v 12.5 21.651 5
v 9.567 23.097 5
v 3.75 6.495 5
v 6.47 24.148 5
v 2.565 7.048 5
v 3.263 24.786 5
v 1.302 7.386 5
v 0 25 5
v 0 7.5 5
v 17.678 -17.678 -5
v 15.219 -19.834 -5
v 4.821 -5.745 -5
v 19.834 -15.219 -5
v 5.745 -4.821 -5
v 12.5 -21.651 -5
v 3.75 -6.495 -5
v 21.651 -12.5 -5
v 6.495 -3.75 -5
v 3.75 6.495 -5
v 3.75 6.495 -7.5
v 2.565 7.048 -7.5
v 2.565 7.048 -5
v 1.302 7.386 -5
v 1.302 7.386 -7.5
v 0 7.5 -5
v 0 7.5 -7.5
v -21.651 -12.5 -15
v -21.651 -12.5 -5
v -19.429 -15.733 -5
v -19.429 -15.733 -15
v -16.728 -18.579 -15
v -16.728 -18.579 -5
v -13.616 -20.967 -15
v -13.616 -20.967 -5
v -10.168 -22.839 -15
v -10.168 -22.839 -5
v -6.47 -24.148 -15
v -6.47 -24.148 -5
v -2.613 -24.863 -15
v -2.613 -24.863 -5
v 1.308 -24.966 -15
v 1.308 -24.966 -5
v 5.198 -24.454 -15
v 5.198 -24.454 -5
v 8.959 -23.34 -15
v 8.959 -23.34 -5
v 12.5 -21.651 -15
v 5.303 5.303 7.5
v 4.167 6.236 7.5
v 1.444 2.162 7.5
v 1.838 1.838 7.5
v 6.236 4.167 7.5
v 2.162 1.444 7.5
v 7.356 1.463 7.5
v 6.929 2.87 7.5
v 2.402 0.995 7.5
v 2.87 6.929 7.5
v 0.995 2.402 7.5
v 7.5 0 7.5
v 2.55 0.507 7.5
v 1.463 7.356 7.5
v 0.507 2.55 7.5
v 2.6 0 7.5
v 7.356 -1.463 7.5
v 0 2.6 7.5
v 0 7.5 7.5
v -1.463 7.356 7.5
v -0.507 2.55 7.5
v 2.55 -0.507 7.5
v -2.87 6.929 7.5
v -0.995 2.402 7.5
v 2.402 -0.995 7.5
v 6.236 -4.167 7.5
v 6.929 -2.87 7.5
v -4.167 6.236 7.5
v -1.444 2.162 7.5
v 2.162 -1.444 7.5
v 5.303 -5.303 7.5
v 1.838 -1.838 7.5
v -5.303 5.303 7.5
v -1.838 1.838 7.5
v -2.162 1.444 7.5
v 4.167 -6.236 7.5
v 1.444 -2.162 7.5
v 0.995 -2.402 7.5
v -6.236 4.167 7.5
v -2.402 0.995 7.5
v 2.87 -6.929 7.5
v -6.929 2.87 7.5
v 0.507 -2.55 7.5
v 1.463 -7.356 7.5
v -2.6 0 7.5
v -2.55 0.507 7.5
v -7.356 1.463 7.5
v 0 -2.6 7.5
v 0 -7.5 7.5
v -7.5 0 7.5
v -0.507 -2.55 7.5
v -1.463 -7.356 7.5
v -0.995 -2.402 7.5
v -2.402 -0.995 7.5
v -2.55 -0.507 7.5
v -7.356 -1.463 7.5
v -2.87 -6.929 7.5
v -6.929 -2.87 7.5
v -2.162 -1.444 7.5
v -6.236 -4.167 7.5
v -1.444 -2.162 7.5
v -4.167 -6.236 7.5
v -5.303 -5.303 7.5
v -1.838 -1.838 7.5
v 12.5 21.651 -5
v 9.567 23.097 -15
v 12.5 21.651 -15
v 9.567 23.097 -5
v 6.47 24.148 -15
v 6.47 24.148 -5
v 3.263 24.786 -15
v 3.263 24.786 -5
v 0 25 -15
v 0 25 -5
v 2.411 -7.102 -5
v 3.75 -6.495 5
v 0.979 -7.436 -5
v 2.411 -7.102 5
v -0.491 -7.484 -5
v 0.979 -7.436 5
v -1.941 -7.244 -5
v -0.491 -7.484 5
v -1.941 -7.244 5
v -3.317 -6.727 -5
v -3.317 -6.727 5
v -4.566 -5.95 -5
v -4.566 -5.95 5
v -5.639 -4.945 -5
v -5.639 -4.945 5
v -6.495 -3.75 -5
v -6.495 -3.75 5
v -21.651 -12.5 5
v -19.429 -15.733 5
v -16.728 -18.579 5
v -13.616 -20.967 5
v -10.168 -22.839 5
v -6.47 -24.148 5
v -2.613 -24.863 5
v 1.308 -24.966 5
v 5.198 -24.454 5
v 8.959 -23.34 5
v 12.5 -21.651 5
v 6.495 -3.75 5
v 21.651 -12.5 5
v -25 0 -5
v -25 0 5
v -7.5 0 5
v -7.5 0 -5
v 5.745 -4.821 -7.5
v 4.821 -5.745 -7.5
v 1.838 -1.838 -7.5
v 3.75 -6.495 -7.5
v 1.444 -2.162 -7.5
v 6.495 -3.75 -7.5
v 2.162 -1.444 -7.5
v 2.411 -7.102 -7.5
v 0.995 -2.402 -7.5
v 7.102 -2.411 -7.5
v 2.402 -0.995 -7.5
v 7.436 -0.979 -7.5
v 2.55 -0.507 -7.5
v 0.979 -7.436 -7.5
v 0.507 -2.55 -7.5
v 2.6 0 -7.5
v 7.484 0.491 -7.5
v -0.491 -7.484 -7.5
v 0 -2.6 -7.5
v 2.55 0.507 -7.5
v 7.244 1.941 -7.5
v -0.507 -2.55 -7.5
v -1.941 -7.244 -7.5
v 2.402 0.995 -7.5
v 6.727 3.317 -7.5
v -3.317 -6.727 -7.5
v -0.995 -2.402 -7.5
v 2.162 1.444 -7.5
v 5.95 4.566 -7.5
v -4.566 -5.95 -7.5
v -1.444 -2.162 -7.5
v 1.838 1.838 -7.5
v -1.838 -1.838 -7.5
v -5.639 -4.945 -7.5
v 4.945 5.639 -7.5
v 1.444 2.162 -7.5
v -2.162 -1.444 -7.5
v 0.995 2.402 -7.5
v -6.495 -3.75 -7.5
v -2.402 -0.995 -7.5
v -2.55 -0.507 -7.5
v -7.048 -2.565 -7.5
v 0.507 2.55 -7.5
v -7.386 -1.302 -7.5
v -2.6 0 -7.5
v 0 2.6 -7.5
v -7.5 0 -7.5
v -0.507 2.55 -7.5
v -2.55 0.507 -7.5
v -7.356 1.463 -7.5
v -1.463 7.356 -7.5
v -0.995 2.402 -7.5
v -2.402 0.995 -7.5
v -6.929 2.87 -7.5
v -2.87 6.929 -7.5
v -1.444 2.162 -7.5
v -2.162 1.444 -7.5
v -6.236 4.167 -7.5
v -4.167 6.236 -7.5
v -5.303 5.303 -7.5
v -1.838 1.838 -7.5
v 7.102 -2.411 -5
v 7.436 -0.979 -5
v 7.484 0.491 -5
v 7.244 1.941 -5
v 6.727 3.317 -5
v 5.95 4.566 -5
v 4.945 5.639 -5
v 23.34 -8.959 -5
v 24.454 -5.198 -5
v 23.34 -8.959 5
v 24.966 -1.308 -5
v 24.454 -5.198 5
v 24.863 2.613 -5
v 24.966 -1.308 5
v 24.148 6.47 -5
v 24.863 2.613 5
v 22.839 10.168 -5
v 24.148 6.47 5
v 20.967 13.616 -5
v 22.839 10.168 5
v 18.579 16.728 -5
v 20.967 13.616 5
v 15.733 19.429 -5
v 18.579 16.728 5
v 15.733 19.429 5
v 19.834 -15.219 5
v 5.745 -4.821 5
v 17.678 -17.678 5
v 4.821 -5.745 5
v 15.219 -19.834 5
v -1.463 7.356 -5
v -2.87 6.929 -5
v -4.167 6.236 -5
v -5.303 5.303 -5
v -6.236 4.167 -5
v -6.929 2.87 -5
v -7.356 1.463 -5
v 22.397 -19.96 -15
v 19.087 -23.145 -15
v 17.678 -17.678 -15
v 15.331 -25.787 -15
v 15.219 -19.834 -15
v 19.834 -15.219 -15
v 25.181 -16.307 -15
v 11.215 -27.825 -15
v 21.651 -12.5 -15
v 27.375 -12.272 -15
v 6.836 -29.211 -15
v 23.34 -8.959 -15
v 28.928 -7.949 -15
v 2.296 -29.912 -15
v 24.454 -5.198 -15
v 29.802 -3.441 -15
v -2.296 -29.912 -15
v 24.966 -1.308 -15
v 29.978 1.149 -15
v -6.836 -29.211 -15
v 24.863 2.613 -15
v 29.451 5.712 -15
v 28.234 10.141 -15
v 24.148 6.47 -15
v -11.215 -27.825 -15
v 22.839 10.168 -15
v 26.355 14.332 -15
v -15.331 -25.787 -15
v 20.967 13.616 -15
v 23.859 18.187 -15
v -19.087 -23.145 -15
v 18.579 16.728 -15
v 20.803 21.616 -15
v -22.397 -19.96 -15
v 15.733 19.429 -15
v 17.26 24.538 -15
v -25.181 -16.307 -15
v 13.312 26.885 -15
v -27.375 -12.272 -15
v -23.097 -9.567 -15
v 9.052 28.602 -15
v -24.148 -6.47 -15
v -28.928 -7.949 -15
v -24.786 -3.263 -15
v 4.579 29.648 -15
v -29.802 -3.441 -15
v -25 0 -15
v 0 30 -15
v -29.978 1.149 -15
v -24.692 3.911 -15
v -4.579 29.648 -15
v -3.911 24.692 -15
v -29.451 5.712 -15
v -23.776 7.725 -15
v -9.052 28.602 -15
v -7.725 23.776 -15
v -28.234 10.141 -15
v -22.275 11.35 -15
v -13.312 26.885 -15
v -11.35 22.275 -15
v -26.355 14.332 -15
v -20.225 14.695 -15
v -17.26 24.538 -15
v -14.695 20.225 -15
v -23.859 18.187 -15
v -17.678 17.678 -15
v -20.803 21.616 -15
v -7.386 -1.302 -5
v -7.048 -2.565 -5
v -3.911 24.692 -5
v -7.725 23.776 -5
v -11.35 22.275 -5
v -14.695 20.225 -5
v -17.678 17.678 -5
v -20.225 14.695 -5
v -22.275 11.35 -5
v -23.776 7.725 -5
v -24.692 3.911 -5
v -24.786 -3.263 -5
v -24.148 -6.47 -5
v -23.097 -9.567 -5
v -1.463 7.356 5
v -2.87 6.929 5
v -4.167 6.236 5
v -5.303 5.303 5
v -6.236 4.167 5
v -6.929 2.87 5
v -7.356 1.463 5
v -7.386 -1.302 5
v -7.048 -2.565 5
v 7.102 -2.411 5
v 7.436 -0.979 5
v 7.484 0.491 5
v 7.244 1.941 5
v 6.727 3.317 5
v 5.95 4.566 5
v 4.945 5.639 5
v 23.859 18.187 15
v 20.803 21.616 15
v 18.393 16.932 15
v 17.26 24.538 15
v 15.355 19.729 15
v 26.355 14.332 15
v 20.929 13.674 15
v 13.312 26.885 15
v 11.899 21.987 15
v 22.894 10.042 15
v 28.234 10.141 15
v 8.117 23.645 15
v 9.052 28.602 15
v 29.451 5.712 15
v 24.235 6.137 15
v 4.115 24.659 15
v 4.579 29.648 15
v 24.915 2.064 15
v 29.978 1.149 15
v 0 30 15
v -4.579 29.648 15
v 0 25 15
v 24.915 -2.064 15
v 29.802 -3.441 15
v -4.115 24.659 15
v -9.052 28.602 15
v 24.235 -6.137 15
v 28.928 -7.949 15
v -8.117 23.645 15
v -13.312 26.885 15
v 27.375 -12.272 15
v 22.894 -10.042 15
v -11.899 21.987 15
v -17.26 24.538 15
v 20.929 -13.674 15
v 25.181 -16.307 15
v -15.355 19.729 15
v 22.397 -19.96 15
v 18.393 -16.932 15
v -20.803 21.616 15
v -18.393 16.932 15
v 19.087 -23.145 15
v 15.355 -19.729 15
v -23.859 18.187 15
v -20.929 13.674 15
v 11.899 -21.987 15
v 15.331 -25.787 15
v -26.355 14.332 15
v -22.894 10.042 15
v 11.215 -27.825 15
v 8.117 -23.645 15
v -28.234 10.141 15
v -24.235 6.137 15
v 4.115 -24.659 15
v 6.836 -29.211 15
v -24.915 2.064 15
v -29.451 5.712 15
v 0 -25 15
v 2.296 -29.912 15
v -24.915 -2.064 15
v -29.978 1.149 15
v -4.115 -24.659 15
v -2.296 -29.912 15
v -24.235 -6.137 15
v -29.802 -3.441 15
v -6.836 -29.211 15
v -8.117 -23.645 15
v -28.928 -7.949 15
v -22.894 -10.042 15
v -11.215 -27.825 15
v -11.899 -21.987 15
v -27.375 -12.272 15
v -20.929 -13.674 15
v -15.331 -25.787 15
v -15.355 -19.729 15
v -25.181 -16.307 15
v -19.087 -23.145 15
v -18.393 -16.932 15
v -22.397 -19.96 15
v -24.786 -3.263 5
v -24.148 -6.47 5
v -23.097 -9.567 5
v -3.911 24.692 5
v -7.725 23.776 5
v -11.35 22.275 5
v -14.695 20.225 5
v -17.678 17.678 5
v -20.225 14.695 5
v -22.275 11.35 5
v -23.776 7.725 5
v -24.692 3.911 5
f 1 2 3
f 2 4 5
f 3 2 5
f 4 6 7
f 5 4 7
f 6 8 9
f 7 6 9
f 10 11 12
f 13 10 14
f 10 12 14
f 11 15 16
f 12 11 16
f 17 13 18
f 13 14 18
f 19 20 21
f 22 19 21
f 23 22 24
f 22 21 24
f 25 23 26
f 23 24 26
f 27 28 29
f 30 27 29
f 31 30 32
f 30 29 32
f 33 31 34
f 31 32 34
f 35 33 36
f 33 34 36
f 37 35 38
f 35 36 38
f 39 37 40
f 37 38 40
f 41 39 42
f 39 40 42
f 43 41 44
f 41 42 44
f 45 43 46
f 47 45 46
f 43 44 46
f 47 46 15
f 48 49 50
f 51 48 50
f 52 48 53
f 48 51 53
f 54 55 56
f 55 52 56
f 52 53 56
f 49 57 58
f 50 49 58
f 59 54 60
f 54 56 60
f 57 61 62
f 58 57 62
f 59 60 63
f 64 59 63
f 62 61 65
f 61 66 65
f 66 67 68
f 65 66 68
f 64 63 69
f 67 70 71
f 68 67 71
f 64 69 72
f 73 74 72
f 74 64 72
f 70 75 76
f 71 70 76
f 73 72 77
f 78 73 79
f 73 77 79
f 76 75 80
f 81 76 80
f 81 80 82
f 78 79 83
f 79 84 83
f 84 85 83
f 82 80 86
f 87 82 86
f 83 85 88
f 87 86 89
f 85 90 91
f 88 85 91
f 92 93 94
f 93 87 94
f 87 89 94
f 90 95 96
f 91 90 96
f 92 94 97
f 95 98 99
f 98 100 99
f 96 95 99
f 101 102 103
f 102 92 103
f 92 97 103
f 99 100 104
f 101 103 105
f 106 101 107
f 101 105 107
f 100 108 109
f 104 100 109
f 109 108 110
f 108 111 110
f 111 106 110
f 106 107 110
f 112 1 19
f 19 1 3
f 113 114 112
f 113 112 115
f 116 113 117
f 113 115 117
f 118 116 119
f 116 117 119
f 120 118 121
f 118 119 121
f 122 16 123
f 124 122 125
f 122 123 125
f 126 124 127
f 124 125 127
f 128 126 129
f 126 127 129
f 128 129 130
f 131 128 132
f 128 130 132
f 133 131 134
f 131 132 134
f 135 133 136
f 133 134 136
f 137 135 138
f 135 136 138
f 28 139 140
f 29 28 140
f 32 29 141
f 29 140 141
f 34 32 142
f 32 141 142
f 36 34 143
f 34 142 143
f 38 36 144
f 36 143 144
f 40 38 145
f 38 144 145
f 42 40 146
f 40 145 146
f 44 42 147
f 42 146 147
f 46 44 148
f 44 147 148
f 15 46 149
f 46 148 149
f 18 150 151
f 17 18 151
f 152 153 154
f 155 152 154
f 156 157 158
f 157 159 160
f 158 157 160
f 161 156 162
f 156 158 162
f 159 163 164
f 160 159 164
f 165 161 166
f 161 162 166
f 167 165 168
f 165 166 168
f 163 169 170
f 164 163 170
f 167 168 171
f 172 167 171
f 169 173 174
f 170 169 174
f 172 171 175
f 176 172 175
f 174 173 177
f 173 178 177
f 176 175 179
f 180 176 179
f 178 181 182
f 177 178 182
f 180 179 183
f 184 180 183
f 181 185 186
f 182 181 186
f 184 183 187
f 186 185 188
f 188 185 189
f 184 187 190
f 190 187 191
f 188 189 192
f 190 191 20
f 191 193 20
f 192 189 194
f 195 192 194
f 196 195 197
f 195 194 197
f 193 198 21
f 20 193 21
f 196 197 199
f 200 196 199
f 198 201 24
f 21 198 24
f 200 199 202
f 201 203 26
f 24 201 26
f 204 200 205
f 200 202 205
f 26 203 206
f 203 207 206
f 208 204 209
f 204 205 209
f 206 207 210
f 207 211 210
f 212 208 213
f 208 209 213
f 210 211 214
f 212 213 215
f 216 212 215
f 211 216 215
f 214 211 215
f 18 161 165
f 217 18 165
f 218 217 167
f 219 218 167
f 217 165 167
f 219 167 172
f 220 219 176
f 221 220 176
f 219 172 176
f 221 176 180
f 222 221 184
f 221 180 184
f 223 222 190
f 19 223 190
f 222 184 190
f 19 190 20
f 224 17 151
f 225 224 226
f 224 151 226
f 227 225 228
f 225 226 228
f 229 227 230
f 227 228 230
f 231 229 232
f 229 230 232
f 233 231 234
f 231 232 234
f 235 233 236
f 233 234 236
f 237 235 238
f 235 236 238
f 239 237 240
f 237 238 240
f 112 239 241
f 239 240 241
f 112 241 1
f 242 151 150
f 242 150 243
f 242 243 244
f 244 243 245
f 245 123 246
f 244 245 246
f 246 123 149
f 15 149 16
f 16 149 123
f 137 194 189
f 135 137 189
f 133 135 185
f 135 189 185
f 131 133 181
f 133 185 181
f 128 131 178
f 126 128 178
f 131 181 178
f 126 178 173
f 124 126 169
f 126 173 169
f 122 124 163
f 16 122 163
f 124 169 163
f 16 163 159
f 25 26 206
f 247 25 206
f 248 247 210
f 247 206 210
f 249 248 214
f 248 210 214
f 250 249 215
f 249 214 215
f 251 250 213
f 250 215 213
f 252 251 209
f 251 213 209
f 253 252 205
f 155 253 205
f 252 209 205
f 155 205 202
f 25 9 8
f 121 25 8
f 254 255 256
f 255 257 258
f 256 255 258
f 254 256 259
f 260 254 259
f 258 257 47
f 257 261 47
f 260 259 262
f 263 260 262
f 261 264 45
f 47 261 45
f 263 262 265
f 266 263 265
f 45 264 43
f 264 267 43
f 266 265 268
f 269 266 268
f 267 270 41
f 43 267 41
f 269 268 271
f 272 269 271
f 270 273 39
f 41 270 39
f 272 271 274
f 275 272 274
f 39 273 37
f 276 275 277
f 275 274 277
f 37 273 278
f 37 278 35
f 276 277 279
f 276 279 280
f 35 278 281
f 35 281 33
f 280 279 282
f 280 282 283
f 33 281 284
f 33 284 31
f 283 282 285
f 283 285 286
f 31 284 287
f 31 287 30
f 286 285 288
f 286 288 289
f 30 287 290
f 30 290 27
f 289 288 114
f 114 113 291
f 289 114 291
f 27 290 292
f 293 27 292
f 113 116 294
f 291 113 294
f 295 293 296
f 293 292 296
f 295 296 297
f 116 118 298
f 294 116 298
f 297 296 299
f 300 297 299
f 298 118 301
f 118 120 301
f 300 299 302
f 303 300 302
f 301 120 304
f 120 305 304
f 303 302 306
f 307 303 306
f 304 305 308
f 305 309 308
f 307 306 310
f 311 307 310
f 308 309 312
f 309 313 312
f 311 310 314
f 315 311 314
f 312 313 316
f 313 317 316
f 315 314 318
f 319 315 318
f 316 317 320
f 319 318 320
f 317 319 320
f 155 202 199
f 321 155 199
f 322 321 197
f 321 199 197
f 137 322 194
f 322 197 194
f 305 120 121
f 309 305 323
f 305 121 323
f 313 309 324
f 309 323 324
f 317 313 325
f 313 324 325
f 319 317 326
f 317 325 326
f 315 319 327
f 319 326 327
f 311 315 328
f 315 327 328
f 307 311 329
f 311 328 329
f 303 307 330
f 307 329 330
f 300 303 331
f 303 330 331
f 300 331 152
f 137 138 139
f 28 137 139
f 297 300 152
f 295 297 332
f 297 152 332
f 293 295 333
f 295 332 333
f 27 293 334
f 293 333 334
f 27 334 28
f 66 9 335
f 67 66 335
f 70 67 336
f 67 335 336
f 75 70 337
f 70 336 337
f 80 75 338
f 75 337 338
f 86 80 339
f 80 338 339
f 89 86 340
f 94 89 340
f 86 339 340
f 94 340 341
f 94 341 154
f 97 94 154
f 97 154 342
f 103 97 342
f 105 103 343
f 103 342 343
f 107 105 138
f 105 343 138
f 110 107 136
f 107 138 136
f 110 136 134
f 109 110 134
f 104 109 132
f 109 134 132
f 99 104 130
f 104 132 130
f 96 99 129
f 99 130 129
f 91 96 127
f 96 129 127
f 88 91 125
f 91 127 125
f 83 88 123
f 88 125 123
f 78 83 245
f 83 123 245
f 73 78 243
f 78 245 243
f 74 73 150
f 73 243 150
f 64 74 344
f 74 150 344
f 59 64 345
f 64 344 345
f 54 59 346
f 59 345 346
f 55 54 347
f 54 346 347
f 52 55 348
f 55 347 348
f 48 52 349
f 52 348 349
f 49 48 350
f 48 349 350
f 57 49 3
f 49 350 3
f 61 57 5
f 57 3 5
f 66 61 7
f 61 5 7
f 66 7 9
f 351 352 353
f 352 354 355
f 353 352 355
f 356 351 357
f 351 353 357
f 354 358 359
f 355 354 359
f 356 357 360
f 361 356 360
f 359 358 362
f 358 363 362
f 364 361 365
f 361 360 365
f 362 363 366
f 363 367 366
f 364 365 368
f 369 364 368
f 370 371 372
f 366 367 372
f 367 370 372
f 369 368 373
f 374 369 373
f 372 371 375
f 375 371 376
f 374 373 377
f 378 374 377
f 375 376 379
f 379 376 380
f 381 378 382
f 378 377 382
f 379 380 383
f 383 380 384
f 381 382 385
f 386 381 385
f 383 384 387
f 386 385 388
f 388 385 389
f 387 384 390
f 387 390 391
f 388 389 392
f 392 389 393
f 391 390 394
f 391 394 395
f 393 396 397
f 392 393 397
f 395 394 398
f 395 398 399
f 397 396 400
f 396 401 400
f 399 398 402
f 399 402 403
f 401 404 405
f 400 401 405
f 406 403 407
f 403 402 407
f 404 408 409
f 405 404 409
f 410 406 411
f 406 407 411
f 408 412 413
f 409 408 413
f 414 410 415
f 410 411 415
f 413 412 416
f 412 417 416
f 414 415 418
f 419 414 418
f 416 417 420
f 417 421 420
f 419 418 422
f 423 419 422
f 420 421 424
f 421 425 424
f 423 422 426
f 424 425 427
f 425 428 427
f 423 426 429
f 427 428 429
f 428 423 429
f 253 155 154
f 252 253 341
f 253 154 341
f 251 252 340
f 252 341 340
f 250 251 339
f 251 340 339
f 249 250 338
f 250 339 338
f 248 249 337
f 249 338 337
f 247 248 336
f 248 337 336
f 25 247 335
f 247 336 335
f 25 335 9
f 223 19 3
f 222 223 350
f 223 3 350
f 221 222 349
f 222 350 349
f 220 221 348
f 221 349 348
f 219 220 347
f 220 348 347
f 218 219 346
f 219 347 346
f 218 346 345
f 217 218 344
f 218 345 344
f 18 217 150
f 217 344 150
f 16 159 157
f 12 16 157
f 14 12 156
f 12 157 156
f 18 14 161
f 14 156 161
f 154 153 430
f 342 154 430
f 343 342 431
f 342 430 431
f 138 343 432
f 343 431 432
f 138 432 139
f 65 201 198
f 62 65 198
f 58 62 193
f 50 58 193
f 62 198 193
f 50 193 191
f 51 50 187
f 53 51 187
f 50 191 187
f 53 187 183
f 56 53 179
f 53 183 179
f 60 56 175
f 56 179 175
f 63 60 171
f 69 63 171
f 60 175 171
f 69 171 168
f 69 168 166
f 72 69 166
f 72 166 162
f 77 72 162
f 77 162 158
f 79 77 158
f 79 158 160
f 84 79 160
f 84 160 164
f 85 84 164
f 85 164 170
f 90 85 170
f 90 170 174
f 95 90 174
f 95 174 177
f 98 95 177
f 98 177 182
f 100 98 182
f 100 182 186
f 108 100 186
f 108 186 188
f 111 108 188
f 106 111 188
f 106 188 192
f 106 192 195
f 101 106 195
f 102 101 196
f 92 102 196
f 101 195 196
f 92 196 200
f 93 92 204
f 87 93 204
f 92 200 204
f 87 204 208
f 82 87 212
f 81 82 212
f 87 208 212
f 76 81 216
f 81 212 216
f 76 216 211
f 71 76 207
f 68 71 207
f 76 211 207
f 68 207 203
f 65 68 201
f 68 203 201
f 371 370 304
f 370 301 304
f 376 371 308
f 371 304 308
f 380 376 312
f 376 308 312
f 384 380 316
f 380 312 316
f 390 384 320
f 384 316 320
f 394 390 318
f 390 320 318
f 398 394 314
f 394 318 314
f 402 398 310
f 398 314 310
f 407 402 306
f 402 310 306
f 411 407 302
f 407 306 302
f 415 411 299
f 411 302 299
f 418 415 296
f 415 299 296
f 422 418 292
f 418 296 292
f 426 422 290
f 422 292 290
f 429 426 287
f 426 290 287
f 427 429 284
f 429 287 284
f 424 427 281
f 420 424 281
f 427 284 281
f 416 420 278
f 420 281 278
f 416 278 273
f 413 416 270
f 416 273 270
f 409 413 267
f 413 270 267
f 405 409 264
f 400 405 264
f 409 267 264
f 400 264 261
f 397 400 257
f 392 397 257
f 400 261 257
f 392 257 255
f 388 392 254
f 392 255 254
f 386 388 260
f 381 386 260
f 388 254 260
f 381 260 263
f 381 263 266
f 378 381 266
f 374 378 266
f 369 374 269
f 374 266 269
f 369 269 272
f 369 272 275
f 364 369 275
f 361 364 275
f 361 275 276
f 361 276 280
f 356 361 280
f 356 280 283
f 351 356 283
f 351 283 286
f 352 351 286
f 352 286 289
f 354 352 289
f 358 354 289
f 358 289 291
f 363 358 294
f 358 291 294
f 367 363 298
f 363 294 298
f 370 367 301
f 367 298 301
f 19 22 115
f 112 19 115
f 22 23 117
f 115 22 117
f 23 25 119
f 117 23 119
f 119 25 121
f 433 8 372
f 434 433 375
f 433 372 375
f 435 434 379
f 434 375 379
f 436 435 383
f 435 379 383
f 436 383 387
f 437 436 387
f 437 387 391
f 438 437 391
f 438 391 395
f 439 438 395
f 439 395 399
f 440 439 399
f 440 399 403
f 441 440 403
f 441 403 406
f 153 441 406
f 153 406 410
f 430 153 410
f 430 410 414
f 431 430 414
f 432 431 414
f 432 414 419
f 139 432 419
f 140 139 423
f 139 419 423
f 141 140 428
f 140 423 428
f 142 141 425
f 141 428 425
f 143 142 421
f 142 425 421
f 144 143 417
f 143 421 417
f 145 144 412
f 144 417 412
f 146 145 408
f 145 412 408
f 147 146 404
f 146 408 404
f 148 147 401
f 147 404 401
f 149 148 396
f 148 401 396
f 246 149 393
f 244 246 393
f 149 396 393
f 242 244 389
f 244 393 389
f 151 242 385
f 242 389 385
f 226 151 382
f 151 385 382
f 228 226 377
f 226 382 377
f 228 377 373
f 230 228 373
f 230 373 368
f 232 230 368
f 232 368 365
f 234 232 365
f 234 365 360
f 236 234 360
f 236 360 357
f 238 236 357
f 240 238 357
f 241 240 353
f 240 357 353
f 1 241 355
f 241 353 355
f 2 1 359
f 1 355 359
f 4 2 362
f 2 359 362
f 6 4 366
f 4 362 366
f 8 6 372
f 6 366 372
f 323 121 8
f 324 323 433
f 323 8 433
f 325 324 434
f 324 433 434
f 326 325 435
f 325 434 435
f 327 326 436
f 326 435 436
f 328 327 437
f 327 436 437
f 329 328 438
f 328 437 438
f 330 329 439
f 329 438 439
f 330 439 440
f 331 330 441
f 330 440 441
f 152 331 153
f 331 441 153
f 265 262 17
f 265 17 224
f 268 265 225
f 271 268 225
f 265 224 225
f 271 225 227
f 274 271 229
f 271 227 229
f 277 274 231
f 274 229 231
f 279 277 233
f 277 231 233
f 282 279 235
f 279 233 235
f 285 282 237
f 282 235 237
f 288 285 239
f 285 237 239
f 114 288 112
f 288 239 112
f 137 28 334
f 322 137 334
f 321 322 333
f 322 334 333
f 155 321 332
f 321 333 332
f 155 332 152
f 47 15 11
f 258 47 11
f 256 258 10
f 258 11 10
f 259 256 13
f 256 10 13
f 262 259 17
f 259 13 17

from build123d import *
from build123d.topology import SkipClean

# Parameters (mm, degrees)
CUT_EXTRUDE1_DEPTH = 47.904157598234306
CIRPATTERN2_COUNT  = 3
SKETCH8_R          = 2.6000000000000005
CUT_EXTRUDE2_DEPTH = 49.02343178074637


with BuildPart() as part:
    # Sketch5 → Revolve2 (revolve)
    with BuildSketch(Plane(origin=(0, 0, 0), x_dir=(0, 0, -1), z_dir=(1, 0, 0))):
        Polygon((-5.000000000000004, 7.5), (-5.000000000000003, 25), (-14.999999999999998, 24.999999999999996), (-14.999999999999998, 30), (14.999999999999998, 30), (14.999999999999998, 24.999999999999996), (5.000000000000003, 25), (5.000000000000004, 7.5), (7.5, 7.499999999999998), (7.499999999999998, -4.8e-16), (-7.499999999999998, -4.8e-16), (-7.5, 7.499999999999998), align=None)
    revolve(axis=Axis((0, 7.4e-16, -11.452014829998802), (0, -1.8e-16, 1)))

    # Sketch7 → Cut-Extrude1 (cut, through all)
    with SkipClean():  # the faces are left unmerged after this step: merging them gives an invalid solid
        with BuildSketch(Plane.XY.offset(5)):
            with BuildLine():
                Line((0, 7.499999999999999), (-2.7040460461e-06, 24.99999999999999))
                ThreePointArc((-2.7040460461e-06, 24.99999999999999), (-17.677670485688406, 17.67766857363911), (-25, -1.041e-14))
                Line((-25, -1.041e-14), (-7.500000000000001, -1.82e-15))
                ThreePointArc((-7.500000000000001, -1.82e-15), (-5.303300858899107, 5.303300858899106), (0, 7.499999999999999))
            make_face()
        cut_extrude1 = extrude(amount=-CUT_EXTRUDE1_DEPTH, mode=Mode.SUBTRACT)

    # CirPattern2: Cut-Extrude1 ×3 about axis
    cirpattern2_axis = Axis((4.4e-16, -2.5e-16, 0), (0, 0, 1))
    for i in range(1, CIRPATTERN2_COUNT):
        add(cut_extrude1.rotate(cirpattern2_axis, i * 360 / CIRPATTERN2_COUNT), mode=Mode.SUBTRACT)

    # Sketch8 → Cut-Extrude2 (cut, through all)
    with BuildSketch(Plane(origin=(0, 1.38e-15, -7.5), x_dir=(-1, 0, 0), z_dir=(0, 1.8e-16, -1))):
        with Locations(Location((0, 0, 0), (0, 0, 90))):
            Circle(SKETCH8_R)
    extrude(amount=-CUT_EXTRUDE2_DEPTH, mode=Mode.SUBTRACT)


solid = part.part
